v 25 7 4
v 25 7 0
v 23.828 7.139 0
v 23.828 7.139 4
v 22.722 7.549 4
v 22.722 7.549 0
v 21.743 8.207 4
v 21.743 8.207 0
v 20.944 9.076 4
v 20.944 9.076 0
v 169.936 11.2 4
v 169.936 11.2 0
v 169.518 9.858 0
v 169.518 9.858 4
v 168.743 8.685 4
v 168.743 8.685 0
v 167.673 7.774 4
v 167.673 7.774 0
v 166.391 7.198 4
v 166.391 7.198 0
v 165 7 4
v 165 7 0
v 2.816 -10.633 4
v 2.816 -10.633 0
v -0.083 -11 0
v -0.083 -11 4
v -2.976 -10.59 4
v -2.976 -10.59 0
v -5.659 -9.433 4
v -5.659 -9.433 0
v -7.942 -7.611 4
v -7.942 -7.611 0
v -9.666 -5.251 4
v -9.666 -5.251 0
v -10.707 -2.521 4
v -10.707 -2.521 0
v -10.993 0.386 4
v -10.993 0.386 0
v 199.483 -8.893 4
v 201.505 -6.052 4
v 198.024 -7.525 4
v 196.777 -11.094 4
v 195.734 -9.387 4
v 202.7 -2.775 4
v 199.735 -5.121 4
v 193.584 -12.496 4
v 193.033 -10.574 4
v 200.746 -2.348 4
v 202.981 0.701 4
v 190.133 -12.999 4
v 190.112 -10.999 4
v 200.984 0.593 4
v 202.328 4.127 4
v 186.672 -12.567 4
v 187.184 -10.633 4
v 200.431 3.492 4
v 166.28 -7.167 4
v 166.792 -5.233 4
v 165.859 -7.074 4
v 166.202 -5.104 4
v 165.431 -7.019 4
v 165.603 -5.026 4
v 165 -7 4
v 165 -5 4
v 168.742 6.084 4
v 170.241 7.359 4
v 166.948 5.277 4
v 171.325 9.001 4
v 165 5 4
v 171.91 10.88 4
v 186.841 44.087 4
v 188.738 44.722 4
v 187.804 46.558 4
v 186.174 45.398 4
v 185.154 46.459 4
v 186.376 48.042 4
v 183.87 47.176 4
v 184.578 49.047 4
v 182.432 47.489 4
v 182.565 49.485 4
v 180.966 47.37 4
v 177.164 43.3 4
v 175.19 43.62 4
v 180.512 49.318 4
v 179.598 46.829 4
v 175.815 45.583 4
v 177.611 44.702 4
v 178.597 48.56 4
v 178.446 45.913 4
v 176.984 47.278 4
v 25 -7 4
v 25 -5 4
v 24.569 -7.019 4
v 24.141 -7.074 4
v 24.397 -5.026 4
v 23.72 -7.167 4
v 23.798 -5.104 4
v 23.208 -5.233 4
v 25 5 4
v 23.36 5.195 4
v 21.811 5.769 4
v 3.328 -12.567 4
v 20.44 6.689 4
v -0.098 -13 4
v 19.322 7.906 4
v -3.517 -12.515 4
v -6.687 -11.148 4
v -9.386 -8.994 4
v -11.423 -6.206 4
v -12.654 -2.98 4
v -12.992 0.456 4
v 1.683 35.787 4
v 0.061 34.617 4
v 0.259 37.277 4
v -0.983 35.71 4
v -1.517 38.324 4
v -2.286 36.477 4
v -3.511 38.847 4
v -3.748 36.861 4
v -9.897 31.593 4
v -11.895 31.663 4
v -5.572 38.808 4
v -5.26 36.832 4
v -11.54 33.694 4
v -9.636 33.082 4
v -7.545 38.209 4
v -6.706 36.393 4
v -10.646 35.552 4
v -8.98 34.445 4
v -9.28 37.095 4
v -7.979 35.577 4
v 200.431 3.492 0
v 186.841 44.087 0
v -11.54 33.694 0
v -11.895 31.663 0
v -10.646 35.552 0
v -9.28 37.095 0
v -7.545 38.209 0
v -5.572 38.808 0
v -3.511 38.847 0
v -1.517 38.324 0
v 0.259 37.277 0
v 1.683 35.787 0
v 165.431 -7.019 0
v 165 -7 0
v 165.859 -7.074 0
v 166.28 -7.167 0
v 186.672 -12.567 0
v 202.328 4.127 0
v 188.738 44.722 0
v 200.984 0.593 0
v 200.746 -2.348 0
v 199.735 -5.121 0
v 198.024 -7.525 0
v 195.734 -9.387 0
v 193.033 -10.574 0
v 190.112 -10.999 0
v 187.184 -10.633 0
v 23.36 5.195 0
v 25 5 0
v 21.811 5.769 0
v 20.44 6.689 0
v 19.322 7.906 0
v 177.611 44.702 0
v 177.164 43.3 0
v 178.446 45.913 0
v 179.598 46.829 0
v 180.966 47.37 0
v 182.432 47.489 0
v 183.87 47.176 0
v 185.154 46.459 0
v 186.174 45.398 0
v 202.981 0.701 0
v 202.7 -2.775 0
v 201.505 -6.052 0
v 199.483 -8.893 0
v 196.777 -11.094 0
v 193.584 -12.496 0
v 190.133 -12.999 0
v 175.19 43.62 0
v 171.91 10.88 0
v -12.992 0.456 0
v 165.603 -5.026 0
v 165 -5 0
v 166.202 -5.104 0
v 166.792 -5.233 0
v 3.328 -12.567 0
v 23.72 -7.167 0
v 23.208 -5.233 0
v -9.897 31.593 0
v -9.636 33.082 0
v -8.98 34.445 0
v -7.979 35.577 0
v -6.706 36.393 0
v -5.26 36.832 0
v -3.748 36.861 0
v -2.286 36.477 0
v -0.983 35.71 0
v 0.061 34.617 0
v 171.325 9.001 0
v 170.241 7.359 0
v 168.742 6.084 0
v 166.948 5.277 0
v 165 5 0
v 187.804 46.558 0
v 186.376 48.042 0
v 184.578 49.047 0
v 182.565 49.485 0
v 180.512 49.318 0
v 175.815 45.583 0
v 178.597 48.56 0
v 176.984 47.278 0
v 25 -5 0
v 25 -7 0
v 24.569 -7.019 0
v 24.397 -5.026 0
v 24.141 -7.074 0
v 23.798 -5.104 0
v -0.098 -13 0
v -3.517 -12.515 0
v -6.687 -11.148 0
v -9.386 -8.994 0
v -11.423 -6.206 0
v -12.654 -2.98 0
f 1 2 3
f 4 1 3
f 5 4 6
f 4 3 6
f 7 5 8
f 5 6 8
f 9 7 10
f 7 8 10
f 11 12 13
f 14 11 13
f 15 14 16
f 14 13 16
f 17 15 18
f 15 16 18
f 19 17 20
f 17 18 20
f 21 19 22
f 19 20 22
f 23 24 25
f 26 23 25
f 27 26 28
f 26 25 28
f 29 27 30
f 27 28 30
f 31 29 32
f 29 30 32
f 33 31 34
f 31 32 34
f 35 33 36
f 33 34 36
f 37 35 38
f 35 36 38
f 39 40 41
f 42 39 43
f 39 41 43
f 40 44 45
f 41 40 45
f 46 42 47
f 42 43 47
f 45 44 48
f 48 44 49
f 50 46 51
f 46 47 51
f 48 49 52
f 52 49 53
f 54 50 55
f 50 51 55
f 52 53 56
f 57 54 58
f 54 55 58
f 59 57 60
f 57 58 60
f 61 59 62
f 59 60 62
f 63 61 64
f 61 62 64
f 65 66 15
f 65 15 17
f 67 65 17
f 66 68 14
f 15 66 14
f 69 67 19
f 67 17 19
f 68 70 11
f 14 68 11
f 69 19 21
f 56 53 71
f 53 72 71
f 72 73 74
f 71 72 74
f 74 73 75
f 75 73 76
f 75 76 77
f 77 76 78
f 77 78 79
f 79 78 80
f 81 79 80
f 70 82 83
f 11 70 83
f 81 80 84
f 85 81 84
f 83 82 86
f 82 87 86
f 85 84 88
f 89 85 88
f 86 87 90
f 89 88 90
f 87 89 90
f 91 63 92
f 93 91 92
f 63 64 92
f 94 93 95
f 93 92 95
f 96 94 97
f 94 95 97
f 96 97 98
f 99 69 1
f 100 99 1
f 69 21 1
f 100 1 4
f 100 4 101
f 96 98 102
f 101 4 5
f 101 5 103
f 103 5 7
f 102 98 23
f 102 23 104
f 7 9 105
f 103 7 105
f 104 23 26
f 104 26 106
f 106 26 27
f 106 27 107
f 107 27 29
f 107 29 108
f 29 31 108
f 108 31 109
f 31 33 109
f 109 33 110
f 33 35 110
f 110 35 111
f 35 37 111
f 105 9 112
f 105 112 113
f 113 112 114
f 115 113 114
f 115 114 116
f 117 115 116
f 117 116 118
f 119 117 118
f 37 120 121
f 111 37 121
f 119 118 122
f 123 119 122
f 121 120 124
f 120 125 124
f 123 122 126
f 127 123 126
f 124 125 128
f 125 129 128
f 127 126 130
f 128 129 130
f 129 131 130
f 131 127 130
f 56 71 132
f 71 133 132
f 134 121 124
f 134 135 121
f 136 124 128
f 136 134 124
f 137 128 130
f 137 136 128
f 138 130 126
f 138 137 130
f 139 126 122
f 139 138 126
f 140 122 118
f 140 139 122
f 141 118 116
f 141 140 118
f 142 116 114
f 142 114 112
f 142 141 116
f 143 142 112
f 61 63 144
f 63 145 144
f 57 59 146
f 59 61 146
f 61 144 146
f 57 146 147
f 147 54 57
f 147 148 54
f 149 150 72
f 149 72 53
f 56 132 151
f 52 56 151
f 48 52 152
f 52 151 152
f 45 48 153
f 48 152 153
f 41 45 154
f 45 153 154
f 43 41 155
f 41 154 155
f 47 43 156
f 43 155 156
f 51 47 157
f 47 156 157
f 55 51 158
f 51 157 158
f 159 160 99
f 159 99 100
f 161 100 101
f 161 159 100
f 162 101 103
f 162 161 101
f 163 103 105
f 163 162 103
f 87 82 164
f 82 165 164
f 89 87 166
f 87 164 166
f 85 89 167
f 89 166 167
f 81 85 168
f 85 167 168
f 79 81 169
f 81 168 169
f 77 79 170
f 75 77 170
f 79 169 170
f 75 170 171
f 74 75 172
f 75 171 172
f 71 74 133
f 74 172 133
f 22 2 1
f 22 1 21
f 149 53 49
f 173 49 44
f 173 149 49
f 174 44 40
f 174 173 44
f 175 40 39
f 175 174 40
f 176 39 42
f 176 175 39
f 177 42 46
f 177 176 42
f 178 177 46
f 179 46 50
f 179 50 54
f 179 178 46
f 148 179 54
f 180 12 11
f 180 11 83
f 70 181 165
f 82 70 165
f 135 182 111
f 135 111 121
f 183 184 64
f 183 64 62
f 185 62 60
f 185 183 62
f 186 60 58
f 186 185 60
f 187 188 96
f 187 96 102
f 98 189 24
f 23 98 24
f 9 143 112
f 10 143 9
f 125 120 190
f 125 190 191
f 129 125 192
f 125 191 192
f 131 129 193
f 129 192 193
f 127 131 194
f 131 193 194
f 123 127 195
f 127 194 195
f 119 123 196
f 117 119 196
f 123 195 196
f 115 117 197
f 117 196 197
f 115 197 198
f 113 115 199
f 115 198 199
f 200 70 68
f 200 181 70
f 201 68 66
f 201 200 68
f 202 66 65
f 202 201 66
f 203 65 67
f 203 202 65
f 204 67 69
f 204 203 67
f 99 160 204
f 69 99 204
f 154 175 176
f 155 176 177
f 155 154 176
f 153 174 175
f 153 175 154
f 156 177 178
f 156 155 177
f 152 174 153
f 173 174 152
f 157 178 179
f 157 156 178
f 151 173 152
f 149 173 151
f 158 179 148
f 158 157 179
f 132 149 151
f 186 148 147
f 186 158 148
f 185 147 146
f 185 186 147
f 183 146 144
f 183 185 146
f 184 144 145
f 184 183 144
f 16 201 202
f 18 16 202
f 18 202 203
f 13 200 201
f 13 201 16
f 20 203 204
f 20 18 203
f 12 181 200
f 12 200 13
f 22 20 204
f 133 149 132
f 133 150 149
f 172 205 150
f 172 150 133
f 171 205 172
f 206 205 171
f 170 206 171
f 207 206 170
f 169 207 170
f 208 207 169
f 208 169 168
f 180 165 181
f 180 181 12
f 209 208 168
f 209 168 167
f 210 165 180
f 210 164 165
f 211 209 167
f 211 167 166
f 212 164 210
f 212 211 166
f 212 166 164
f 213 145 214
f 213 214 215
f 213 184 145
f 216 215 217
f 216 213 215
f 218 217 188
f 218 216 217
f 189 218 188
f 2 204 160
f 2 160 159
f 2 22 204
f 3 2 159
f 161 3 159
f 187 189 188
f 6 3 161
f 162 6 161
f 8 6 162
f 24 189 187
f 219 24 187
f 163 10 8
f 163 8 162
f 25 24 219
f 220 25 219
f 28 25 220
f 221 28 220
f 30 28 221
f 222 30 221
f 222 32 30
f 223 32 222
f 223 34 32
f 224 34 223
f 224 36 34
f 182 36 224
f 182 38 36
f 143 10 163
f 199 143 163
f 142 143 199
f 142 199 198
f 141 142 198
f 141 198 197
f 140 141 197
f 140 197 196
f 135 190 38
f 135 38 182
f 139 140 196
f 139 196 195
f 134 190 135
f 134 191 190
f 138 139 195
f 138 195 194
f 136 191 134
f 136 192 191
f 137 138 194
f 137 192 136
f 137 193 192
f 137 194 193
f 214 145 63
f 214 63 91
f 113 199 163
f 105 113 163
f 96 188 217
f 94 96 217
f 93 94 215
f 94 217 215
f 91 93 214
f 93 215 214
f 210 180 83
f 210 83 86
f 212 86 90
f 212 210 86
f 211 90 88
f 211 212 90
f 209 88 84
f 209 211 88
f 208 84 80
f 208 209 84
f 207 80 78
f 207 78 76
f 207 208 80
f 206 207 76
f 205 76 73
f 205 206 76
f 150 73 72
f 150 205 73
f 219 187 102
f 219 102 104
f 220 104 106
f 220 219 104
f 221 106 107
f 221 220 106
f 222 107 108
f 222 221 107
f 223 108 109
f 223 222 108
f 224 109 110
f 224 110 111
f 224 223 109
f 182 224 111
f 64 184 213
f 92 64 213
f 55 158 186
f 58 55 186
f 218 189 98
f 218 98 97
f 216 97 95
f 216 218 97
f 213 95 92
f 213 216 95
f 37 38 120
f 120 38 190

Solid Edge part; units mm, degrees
sketch "Sketch1" plane through (0, 0, 0) normal (0, 0, 1) x (1, 0, 0)
  line L0 (165, -7) -> (25, -7)
  arc A0 (25, -7) -> (23.72, -7.1666) centre (25, -12) ccw
  line L1 (23.72, -7.1666) -> (3.3279, -12.5668)
  arc A1 (3.3279, -12.5668) -> (-12.992, 0.4565) centre (0, 0) cw
  line L2 (-12.992, 0.4565) -> (-11.8954, 31.6634)
  arc A2 (-11.8954, 31.6634) -> (1.6834, 35.7866) centre (-4.4, 31.4) cw
  line L3 (1.6834, 35.7866) -> (20.9444, 9.0756)
  arc A3 (20.9444, 9.0756) -> (25, 7) centre (25, 12) ccw
  line L4 (25, 7) -> (165, 7)
  arc A4 (165, 7) -> (169.9356, 11.2) centre (165, 12) ccw
  line L5 (169.9356, 11.2) -> (175.1902, 43.6199)
  arc A5 (175.1902, 43.6199) -> (188.7379, 44.7221) centre (182.1, 42.5) cw
  line L6 (188.7379, 44.7221) -> (202.3276, 4.1268)
  arc A6 (202.3276, 4.1268) -> (186.6721, -12.5668) centre (190, 0) cw
  line L7 (186.6721, -12.5668) -> (166.28, -7.1666)
  arc A7 (166.28, -7.1666) -> (165, -7) centre (165, -12) ccw
  line L8 (165, -5) -> (25, -5)
  arc A8 (25, -5) -> (23.208, -5.2333) centre (25, -12) ccw
  line L9 (23.208, -5.2333) -> (2.8159, -10.6335)
  arc A9 (2.8159, -10.6335) -> (-10.9932, 0.3863) centre (0, 0) cw
  line L10 (-10.9932, 0.3863) -> (-9.8966, 31.5932)
  arc A10 (-9.8966, 31.5932) -> (0.0611, 34.6169) centre (-4.4, 31.4) cw
  line L11 (0.0611, 34.6169) -> (19.3222, 7.9058)
  arc A11 (19.3222, 7.9058) -> (25, 5) centre (25, 12) ccw
  line L12 (25, 5) -> (165, 5)
  arc A12 (165, 5) -> (171.9098, 10.8801) centre (165, 12) ccw
  line L13 (171.9098, 10.8801) -> (177.1644, 43.3)
  arc A13 (177.1644, 43.3) -> (186.8414, 44.0872) centre (182.1, 42.5) cw
  line L14 (186.8414, 44.0872) -> (200.431, 3.4919)
  arc A14 (200.431, 3.4919) -> (187.1841, -10.6335) centre (190, 0) cw
  line L15 (187.1841, -10.6335) -> (166.792, -5.2333)
  arc A15 (166.792, -5.2333) -> (165, -5) centre (165, -12) ccw
  dimension "D1" = 24
  dimension "D2" = 1
  dimension "D3" = 1
  dimension "D4" = 1
  dimension "D5" = 1
  dimension "D6" = 1
  dimension "D7" = 1
  dimension "D8" = 1
extrude "Protrusion1" add sketch "Sketch1" along normal blind 4
properties material "Steel"
